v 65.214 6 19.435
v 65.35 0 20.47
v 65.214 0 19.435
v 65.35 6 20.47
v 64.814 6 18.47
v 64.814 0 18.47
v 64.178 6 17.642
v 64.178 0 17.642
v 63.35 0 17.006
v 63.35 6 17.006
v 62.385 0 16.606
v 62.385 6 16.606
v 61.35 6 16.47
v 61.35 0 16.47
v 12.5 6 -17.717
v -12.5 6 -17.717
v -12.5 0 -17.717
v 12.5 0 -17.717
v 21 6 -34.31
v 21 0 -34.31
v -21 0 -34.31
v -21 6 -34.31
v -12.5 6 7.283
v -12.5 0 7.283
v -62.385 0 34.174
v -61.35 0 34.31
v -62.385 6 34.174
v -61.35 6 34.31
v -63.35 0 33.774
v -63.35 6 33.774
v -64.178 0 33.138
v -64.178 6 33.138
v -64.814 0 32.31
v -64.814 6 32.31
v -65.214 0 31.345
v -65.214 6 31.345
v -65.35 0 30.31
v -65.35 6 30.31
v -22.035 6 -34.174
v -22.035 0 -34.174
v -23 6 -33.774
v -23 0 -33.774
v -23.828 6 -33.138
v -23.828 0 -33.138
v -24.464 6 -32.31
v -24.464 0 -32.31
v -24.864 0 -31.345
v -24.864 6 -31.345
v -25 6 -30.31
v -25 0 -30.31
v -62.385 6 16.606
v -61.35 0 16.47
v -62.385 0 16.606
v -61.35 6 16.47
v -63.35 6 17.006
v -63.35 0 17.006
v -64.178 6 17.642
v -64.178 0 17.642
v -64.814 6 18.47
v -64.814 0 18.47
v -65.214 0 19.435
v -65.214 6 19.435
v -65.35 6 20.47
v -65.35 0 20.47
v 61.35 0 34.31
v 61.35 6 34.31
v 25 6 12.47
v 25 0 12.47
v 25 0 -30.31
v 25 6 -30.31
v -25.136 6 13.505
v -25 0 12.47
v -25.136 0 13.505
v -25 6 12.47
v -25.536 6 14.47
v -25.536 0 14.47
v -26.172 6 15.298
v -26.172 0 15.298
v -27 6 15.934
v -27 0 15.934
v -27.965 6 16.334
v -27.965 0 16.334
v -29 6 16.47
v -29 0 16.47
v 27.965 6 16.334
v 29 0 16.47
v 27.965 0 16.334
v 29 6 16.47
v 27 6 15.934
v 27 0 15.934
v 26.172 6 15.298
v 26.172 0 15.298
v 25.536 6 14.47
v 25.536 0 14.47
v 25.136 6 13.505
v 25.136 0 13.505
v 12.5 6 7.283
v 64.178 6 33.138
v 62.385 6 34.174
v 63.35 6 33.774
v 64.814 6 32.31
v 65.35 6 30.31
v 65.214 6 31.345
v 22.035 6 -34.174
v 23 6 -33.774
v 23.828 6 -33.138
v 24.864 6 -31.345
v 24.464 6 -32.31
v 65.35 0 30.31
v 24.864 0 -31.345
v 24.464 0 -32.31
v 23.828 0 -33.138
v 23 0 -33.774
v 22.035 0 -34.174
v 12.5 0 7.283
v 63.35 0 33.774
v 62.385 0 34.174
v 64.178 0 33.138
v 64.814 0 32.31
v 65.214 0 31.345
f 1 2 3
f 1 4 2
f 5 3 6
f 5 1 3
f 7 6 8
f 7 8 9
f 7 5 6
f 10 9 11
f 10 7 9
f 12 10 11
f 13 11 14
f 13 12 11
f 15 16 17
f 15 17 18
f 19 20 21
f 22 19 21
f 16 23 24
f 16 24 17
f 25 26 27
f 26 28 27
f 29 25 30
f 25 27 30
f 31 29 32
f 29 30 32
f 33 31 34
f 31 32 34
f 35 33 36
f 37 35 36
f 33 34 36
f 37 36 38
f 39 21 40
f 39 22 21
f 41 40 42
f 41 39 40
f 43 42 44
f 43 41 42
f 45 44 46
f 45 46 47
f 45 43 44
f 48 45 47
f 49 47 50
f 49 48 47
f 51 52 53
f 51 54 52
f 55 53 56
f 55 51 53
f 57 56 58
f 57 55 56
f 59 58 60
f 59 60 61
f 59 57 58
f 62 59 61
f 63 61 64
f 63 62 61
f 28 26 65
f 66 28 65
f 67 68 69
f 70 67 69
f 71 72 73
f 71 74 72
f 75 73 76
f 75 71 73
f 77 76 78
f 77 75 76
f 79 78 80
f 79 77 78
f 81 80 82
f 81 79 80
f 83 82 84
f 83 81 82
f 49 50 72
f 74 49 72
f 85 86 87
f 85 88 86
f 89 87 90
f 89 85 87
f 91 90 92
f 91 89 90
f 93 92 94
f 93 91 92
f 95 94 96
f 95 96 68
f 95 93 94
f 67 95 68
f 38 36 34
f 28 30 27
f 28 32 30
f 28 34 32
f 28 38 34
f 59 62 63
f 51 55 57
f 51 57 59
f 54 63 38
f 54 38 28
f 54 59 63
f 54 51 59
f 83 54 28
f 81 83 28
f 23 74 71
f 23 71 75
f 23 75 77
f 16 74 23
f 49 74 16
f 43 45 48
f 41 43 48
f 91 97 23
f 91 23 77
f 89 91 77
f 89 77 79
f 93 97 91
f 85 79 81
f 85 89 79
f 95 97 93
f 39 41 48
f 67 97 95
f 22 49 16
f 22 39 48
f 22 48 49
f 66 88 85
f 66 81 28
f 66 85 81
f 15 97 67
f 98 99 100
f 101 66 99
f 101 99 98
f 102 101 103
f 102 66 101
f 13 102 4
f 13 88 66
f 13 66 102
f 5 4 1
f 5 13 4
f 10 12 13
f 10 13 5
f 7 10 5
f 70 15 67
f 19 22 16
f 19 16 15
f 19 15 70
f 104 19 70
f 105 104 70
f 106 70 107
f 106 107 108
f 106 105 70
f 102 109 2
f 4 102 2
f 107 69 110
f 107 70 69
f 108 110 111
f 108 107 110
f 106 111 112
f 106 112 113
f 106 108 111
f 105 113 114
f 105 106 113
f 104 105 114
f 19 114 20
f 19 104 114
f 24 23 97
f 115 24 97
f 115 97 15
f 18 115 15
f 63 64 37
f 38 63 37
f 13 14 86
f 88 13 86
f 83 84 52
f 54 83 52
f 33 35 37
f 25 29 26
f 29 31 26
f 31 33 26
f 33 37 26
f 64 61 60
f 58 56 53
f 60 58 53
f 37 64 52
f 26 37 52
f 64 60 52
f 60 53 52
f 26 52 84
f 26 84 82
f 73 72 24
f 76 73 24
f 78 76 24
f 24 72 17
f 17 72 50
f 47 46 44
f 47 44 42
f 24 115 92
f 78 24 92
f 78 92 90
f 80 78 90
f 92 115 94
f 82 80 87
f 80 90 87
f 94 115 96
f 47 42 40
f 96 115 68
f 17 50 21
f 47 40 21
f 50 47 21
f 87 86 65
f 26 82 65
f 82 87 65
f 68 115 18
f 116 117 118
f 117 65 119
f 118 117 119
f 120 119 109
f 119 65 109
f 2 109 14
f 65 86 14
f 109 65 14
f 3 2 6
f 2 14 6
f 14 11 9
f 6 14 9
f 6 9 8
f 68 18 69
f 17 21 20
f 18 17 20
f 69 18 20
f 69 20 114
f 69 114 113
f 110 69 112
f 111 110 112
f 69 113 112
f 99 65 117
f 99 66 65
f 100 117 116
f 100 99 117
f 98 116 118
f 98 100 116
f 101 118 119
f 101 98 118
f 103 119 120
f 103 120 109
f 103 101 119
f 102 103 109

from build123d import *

# Parameters (mm, degrees)
BOSS_EXTRUDE1_DEPTH = 6
FILLET1_R           = 4
SKETCH2_W           = 25
SKETCH2_H           = 25
CUT_EXTRUDE1_DEPTH  = 6


with BuildPart() as part:
    # Sketch1 → Boss-Extrude1 (new body)
    with BuildSketch(Plane(origin=(0, 0, 0), x_dir=(1, 0, 0), z_dir=(0, 1, 0))):
        Polygon((-65.35, -34.31), (65.35, -34.31), (65.35, -16.47), (25, -16.47), (25, 34.31), (-25, 34.31), (-25, -16.47), (-65.35, -16.47), align=None)
    extrude(amount=BOSS_EXTRUDE1_DEPTH)

    # Fillet1
    fillet1_edges = [part.edges().sort_by_distance(p)[0] for p in [
        (65.35, 3, 34.31),
        (-65.35, 3, 34.31),
        (-65.35, 3, 16.47),
        (-25, 3, 16.47),
        (-25, 3, -34.31),
        (25, 3, -34.31),
        (25, 3, 16.47),
        (65.35, 3, 16.47),
    ]]
    fillet(fillet1_edges, radius=FILLET1_R)

    # Sketch2 → Cut-Extrude1 (cut)
    with BuildSketch(Plane(origin=(0, 6, 0), x_dir=(1, 0, 0), z_dir=(0, 1, 0))):
        with Locations((0, 5.216940009)):
            Rectangle(SKETCH2_W, SKETCH2_H)
    extrude(amount=-CUT_EXTRUDE1_DEPTH, mode=Mode.SUBTRACT)


solid = part.part
